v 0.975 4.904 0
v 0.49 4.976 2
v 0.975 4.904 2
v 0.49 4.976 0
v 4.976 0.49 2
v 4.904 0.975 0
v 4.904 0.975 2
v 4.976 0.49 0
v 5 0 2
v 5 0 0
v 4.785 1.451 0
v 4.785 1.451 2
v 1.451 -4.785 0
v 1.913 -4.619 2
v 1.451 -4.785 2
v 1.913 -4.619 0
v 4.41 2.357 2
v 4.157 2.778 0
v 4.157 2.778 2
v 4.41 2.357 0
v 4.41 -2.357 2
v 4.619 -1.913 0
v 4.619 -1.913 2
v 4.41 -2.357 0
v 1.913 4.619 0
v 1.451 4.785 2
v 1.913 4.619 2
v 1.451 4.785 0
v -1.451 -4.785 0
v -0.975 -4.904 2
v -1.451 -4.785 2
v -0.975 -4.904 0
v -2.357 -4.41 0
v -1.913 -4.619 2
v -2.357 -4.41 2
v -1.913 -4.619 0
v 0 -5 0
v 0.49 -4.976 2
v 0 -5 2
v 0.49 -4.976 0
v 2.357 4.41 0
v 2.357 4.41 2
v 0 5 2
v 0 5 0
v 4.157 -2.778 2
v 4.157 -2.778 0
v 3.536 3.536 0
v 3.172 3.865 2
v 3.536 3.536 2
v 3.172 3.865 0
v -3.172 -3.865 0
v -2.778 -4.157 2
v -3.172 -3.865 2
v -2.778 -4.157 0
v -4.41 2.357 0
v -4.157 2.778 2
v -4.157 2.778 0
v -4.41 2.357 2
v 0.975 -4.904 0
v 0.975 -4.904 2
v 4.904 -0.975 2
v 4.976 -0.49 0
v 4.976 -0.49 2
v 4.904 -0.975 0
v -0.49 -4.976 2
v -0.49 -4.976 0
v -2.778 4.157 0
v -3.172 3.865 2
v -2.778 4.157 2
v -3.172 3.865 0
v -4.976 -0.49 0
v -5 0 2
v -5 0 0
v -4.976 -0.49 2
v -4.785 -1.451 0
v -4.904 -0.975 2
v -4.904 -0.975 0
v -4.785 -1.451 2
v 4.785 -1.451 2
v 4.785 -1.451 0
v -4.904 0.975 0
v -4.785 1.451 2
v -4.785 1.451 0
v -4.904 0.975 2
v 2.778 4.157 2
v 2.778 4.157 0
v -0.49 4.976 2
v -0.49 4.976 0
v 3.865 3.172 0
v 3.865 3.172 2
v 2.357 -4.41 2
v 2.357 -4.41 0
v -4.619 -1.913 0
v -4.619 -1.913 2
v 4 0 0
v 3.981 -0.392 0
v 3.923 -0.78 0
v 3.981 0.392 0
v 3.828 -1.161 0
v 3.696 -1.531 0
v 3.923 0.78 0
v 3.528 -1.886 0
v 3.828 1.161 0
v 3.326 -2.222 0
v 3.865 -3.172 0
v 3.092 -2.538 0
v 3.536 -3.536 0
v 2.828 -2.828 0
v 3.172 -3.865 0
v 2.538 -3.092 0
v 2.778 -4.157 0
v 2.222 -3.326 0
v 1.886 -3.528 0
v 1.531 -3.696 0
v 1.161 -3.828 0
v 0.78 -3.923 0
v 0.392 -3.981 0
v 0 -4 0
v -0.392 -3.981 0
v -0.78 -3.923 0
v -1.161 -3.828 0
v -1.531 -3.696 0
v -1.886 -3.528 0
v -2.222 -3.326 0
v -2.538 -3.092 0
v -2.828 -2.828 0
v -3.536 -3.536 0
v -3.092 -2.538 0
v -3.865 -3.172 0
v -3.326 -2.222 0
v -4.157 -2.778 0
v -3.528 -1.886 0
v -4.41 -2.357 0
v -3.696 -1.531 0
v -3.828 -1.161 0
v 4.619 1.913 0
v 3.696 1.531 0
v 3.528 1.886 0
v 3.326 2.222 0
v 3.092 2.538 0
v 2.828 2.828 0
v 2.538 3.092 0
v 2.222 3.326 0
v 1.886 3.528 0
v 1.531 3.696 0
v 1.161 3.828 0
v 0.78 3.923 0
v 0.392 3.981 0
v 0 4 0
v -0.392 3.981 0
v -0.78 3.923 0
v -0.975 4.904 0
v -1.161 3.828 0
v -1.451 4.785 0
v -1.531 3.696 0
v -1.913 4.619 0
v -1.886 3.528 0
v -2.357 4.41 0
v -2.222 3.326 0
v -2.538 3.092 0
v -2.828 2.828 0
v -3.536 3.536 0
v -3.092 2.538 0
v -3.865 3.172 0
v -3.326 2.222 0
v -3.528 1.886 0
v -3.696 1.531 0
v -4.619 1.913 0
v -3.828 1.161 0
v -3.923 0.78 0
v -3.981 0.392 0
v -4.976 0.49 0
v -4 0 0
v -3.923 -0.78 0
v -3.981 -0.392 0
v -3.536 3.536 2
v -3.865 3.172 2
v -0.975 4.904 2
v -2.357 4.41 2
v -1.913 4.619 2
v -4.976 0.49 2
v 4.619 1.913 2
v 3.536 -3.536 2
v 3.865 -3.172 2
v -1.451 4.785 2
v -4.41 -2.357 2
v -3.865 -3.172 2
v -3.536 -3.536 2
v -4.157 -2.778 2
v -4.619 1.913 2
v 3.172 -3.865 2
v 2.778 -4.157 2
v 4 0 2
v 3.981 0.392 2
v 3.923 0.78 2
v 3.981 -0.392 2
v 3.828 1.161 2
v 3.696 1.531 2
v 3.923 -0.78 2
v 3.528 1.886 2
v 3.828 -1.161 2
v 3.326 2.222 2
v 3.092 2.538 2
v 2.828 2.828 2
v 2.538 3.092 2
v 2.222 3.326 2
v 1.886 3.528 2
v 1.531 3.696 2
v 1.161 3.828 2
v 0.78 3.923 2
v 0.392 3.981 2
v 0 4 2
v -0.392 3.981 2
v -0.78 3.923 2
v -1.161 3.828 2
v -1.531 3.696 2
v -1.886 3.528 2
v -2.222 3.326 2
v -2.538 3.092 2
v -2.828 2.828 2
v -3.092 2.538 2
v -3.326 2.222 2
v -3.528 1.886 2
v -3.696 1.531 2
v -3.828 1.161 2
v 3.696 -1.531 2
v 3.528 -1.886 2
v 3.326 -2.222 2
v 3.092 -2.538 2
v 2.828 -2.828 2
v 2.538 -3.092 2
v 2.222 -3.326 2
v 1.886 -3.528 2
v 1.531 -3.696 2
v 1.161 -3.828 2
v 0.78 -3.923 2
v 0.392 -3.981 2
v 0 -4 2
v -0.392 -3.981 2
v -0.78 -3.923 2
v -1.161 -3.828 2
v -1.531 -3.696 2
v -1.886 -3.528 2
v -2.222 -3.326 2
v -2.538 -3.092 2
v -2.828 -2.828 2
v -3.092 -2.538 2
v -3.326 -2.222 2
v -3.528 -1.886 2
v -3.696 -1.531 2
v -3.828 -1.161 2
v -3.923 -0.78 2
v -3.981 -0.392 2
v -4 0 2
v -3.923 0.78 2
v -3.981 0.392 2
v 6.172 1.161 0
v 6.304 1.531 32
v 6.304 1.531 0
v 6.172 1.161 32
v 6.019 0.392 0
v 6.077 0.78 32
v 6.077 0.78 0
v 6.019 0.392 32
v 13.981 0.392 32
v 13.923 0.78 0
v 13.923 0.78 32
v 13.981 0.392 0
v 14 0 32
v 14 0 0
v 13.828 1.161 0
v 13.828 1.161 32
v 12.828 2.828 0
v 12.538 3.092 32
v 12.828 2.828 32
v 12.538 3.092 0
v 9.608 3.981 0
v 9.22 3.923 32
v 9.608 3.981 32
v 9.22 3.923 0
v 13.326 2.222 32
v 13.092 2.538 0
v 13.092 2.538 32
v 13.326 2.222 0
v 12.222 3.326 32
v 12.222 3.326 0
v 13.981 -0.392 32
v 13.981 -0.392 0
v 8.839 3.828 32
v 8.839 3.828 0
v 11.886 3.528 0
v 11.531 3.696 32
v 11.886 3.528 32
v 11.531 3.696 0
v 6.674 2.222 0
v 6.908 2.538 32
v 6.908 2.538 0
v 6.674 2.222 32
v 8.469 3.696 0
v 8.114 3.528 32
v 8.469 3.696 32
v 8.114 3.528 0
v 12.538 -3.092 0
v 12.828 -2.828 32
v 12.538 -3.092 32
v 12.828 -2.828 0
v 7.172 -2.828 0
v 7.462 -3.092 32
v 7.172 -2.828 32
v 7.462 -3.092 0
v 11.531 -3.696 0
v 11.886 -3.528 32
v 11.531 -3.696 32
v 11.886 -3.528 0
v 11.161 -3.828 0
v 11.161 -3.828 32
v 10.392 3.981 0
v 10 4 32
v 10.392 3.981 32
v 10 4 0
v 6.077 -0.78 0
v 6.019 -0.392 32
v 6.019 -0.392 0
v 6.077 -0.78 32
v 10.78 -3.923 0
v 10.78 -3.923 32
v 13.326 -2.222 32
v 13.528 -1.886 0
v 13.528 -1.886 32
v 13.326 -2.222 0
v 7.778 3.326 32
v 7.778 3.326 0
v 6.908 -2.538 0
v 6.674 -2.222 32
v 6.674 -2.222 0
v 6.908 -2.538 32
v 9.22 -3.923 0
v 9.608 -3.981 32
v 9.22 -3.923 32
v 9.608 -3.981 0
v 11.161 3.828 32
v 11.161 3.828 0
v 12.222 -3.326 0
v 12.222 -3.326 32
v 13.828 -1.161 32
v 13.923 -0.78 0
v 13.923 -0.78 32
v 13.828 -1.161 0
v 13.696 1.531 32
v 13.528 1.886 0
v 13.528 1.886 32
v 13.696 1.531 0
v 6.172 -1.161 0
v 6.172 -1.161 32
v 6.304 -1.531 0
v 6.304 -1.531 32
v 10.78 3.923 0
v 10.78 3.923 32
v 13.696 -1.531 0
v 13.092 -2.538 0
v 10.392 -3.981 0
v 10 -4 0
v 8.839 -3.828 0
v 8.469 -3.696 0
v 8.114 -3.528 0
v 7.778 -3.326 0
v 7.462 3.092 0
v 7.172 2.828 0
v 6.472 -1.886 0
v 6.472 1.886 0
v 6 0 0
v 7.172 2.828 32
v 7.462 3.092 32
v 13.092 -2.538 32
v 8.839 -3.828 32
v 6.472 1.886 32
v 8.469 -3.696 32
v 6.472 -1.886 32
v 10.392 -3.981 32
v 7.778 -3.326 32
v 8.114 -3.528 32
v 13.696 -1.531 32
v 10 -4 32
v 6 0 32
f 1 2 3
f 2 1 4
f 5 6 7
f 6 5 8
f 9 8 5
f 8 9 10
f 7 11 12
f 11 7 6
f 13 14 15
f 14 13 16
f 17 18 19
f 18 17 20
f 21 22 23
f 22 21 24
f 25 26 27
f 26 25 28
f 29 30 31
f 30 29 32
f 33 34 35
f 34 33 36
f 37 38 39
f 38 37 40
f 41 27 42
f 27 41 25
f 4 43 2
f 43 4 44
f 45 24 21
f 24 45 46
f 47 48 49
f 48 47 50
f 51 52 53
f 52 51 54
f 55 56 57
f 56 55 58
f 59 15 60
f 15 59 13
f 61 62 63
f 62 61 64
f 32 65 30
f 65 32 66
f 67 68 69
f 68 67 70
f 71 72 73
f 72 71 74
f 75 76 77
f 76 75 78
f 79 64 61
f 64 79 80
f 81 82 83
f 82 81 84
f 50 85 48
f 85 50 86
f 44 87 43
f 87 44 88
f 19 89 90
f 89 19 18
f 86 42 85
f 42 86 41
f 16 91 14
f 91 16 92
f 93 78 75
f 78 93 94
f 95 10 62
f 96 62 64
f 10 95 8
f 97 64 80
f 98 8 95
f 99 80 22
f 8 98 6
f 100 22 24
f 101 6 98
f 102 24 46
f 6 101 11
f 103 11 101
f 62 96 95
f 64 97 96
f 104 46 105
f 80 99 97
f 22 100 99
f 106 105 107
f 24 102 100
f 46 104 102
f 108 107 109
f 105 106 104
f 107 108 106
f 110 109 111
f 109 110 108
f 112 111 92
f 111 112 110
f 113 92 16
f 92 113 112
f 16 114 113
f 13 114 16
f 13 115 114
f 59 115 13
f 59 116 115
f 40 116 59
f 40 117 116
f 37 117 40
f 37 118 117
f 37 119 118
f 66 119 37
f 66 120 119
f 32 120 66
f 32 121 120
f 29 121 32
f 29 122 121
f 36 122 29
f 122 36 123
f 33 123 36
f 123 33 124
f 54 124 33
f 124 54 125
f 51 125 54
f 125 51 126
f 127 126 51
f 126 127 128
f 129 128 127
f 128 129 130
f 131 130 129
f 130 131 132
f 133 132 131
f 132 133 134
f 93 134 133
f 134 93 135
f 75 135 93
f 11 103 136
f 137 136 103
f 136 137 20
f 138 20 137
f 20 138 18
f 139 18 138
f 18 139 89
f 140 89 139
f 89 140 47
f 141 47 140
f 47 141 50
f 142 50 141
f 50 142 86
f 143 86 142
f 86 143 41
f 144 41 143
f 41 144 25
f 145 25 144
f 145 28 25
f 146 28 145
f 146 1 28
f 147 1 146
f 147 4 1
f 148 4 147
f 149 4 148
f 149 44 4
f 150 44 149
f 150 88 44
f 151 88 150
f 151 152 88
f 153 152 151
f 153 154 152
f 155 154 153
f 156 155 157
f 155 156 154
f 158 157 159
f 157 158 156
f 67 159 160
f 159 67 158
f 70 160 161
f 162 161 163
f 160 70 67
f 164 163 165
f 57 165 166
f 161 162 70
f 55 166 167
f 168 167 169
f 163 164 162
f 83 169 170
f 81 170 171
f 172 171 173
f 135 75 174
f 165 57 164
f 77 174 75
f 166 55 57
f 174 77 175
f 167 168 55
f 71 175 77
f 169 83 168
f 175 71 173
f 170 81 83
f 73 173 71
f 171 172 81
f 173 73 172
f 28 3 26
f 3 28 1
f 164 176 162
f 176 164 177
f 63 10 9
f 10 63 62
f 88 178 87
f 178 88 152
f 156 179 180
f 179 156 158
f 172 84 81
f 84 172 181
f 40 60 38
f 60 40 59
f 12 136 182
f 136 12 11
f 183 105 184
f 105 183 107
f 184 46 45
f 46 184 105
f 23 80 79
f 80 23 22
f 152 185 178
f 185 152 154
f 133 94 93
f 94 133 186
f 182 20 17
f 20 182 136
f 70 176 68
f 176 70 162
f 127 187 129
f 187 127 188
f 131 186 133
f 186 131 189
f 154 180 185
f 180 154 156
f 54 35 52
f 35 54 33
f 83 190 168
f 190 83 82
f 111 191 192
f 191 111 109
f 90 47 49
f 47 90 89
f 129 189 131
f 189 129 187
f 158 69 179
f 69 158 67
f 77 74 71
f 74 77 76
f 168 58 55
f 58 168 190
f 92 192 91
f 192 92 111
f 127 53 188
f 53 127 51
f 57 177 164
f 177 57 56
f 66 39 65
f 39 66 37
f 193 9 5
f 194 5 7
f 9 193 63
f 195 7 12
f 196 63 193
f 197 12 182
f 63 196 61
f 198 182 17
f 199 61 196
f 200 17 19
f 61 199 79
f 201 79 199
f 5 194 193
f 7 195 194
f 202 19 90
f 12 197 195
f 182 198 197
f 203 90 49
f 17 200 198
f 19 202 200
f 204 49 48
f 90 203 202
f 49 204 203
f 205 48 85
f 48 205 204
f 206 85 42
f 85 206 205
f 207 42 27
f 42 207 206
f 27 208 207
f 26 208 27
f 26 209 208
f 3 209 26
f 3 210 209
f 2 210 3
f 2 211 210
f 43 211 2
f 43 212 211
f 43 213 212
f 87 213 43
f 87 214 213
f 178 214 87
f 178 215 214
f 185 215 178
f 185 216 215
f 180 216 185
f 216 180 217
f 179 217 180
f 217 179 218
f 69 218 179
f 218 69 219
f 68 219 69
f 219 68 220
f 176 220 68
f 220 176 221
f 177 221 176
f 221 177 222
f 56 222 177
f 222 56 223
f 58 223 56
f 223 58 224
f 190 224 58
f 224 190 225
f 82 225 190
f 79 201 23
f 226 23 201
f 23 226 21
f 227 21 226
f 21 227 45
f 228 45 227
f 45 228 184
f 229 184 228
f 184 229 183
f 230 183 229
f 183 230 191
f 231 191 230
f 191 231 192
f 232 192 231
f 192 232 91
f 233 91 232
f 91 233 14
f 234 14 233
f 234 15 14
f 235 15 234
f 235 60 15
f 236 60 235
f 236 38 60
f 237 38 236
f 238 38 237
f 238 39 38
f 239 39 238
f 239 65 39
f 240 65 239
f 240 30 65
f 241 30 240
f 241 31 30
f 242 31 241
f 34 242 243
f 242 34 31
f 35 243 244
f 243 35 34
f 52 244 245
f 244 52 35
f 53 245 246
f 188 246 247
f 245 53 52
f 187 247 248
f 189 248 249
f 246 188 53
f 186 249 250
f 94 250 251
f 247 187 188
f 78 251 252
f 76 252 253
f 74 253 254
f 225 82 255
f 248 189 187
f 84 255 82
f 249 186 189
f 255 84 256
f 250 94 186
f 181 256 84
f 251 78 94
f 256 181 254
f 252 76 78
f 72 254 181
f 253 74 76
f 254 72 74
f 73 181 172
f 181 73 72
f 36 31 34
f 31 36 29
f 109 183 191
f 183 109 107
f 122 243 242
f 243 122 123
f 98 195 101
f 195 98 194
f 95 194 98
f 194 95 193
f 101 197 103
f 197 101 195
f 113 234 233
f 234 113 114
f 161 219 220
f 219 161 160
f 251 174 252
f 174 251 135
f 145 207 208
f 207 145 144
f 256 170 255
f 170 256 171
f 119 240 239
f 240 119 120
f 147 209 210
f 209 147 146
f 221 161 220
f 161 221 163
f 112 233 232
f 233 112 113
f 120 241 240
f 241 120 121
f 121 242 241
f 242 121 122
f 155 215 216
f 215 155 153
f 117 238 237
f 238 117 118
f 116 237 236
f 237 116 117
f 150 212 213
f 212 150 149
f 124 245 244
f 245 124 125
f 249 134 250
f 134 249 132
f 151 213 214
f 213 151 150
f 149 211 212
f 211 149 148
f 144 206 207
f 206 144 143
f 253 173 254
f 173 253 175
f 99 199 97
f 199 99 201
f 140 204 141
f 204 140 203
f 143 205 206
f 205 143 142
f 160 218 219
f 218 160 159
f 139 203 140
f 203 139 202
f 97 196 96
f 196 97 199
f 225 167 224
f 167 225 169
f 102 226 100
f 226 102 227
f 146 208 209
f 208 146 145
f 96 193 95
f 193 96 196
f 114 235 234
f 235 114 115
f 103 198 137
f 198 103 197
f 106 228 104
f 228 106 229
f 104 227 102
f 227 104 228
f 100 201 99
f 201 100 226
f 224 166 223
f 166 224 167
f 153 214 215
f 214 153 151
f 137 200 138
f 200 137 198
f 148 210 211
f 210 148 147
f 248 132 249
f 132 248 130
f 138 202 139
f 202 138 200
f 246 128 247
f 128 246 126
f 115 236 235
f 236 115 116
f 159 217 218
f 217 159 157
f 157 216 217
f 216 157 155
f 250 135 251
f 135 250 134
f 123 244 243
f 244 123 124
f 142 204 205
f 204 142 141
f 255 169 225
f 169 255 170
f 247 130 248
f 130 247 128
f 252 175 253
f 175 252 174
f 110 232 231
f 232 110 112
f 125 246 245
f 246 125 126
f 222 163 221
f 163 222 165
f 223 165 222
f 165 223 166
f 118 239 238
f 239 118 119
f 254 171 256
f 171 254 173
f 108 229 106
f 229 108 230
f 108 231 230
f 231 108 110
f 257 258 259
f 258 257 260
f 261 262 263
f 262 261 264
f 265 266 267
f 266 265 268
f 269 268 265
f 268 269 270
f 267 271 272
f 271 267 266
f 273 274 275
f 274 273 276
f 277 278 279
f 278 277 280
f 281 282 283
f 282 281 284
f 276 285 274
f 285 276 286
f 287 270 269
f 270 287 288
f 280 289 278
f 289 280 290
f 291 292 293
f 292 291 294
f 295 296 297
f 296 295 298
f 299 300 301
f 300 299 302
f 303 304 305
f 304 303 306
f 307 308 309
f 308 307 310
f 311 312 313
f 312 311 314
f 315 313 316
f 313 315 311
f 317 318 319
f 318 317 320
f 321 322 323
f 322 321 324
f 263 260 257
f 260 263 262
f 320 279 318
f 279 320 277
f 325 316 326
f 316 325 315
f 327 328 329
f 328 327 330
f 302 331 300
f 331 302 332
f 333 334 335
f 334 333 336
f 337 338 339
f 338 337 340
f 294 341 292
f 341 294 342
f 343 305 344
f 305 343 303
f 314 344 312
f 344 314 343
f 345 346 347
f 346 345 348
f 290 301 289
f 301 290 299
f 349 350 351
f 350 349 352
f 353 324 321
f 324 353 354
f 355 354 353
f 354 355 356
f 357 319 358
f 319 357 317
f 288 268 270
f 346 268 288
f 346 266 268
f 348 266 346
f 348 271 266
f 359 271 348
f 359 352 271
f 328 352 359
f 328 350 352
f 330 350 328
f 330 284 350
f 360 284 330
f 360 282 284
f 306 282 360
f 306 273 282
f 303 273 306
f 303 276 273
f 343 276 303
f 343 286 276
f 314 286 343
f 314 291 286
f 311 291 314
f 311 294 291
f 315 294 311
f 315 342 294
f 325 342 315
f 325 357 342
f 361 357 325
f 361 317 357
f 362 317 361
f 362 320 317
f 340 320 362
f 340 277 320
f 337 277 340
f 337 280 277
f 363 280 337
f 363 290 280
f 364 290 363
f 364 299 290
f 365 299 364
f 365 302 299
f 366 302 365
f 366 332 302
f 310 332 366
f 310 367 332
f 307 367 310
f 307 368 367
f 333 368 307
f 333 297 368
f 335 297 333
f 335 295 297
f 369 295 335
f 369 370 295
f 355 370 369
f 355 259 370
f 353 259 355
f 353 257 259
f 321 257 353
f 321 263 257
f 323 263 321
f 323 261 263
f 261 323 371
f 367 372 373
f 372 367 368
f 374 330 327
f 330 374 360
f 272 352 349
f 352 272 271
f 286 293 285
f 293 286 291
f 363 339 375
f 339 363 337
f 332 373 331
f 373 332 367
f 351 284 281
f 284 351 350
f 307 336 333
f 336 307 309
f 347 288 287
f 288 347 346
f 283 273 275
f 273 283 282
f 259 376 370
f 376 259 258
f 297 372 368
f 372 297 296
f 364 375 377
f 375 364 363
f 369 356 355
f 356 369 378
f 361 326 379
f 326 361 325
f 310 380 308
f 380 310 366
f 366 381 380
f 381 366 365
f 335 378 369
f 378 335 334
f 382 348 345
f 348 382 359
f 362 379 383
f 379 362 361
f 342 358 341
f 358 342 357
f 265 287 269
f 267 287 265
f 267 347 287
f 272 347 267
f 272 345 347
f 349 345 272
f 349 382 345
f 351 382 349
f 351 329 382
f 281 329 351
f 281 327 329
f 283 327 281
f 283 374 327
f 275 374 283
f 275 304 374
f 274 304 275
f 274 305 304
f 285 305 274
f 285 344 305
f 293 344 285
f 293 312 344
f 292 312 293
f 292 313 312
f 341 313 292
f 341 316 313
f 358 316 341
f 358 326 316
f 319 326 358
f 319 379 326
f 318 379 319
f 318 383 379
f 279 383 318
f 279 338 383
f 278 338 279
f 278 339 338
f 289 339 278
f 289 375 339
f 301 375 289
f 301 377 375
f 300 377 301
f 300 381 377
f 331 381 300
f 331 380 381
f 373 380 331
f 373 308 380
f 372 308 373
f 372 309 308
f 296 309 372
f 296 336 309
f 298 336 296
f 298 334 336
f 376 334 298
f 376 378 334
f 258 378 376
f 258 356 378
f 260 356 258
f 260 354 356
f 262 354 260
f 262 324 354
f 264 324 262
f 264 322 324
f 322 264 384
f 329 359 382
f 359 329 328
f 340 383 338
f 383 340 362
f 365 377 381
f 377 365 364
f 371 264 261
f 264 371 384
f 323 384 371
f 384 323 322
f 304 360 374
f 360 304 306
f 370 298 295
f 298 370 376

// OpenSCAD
$fn=64;

difference() {
    cylinder(h = 2, r = 5);
    translate([0,0,-1]) cylinder(h= 4, r=4);
};

translate([10,0,0])  cylinder(h = 32, r = 4);
